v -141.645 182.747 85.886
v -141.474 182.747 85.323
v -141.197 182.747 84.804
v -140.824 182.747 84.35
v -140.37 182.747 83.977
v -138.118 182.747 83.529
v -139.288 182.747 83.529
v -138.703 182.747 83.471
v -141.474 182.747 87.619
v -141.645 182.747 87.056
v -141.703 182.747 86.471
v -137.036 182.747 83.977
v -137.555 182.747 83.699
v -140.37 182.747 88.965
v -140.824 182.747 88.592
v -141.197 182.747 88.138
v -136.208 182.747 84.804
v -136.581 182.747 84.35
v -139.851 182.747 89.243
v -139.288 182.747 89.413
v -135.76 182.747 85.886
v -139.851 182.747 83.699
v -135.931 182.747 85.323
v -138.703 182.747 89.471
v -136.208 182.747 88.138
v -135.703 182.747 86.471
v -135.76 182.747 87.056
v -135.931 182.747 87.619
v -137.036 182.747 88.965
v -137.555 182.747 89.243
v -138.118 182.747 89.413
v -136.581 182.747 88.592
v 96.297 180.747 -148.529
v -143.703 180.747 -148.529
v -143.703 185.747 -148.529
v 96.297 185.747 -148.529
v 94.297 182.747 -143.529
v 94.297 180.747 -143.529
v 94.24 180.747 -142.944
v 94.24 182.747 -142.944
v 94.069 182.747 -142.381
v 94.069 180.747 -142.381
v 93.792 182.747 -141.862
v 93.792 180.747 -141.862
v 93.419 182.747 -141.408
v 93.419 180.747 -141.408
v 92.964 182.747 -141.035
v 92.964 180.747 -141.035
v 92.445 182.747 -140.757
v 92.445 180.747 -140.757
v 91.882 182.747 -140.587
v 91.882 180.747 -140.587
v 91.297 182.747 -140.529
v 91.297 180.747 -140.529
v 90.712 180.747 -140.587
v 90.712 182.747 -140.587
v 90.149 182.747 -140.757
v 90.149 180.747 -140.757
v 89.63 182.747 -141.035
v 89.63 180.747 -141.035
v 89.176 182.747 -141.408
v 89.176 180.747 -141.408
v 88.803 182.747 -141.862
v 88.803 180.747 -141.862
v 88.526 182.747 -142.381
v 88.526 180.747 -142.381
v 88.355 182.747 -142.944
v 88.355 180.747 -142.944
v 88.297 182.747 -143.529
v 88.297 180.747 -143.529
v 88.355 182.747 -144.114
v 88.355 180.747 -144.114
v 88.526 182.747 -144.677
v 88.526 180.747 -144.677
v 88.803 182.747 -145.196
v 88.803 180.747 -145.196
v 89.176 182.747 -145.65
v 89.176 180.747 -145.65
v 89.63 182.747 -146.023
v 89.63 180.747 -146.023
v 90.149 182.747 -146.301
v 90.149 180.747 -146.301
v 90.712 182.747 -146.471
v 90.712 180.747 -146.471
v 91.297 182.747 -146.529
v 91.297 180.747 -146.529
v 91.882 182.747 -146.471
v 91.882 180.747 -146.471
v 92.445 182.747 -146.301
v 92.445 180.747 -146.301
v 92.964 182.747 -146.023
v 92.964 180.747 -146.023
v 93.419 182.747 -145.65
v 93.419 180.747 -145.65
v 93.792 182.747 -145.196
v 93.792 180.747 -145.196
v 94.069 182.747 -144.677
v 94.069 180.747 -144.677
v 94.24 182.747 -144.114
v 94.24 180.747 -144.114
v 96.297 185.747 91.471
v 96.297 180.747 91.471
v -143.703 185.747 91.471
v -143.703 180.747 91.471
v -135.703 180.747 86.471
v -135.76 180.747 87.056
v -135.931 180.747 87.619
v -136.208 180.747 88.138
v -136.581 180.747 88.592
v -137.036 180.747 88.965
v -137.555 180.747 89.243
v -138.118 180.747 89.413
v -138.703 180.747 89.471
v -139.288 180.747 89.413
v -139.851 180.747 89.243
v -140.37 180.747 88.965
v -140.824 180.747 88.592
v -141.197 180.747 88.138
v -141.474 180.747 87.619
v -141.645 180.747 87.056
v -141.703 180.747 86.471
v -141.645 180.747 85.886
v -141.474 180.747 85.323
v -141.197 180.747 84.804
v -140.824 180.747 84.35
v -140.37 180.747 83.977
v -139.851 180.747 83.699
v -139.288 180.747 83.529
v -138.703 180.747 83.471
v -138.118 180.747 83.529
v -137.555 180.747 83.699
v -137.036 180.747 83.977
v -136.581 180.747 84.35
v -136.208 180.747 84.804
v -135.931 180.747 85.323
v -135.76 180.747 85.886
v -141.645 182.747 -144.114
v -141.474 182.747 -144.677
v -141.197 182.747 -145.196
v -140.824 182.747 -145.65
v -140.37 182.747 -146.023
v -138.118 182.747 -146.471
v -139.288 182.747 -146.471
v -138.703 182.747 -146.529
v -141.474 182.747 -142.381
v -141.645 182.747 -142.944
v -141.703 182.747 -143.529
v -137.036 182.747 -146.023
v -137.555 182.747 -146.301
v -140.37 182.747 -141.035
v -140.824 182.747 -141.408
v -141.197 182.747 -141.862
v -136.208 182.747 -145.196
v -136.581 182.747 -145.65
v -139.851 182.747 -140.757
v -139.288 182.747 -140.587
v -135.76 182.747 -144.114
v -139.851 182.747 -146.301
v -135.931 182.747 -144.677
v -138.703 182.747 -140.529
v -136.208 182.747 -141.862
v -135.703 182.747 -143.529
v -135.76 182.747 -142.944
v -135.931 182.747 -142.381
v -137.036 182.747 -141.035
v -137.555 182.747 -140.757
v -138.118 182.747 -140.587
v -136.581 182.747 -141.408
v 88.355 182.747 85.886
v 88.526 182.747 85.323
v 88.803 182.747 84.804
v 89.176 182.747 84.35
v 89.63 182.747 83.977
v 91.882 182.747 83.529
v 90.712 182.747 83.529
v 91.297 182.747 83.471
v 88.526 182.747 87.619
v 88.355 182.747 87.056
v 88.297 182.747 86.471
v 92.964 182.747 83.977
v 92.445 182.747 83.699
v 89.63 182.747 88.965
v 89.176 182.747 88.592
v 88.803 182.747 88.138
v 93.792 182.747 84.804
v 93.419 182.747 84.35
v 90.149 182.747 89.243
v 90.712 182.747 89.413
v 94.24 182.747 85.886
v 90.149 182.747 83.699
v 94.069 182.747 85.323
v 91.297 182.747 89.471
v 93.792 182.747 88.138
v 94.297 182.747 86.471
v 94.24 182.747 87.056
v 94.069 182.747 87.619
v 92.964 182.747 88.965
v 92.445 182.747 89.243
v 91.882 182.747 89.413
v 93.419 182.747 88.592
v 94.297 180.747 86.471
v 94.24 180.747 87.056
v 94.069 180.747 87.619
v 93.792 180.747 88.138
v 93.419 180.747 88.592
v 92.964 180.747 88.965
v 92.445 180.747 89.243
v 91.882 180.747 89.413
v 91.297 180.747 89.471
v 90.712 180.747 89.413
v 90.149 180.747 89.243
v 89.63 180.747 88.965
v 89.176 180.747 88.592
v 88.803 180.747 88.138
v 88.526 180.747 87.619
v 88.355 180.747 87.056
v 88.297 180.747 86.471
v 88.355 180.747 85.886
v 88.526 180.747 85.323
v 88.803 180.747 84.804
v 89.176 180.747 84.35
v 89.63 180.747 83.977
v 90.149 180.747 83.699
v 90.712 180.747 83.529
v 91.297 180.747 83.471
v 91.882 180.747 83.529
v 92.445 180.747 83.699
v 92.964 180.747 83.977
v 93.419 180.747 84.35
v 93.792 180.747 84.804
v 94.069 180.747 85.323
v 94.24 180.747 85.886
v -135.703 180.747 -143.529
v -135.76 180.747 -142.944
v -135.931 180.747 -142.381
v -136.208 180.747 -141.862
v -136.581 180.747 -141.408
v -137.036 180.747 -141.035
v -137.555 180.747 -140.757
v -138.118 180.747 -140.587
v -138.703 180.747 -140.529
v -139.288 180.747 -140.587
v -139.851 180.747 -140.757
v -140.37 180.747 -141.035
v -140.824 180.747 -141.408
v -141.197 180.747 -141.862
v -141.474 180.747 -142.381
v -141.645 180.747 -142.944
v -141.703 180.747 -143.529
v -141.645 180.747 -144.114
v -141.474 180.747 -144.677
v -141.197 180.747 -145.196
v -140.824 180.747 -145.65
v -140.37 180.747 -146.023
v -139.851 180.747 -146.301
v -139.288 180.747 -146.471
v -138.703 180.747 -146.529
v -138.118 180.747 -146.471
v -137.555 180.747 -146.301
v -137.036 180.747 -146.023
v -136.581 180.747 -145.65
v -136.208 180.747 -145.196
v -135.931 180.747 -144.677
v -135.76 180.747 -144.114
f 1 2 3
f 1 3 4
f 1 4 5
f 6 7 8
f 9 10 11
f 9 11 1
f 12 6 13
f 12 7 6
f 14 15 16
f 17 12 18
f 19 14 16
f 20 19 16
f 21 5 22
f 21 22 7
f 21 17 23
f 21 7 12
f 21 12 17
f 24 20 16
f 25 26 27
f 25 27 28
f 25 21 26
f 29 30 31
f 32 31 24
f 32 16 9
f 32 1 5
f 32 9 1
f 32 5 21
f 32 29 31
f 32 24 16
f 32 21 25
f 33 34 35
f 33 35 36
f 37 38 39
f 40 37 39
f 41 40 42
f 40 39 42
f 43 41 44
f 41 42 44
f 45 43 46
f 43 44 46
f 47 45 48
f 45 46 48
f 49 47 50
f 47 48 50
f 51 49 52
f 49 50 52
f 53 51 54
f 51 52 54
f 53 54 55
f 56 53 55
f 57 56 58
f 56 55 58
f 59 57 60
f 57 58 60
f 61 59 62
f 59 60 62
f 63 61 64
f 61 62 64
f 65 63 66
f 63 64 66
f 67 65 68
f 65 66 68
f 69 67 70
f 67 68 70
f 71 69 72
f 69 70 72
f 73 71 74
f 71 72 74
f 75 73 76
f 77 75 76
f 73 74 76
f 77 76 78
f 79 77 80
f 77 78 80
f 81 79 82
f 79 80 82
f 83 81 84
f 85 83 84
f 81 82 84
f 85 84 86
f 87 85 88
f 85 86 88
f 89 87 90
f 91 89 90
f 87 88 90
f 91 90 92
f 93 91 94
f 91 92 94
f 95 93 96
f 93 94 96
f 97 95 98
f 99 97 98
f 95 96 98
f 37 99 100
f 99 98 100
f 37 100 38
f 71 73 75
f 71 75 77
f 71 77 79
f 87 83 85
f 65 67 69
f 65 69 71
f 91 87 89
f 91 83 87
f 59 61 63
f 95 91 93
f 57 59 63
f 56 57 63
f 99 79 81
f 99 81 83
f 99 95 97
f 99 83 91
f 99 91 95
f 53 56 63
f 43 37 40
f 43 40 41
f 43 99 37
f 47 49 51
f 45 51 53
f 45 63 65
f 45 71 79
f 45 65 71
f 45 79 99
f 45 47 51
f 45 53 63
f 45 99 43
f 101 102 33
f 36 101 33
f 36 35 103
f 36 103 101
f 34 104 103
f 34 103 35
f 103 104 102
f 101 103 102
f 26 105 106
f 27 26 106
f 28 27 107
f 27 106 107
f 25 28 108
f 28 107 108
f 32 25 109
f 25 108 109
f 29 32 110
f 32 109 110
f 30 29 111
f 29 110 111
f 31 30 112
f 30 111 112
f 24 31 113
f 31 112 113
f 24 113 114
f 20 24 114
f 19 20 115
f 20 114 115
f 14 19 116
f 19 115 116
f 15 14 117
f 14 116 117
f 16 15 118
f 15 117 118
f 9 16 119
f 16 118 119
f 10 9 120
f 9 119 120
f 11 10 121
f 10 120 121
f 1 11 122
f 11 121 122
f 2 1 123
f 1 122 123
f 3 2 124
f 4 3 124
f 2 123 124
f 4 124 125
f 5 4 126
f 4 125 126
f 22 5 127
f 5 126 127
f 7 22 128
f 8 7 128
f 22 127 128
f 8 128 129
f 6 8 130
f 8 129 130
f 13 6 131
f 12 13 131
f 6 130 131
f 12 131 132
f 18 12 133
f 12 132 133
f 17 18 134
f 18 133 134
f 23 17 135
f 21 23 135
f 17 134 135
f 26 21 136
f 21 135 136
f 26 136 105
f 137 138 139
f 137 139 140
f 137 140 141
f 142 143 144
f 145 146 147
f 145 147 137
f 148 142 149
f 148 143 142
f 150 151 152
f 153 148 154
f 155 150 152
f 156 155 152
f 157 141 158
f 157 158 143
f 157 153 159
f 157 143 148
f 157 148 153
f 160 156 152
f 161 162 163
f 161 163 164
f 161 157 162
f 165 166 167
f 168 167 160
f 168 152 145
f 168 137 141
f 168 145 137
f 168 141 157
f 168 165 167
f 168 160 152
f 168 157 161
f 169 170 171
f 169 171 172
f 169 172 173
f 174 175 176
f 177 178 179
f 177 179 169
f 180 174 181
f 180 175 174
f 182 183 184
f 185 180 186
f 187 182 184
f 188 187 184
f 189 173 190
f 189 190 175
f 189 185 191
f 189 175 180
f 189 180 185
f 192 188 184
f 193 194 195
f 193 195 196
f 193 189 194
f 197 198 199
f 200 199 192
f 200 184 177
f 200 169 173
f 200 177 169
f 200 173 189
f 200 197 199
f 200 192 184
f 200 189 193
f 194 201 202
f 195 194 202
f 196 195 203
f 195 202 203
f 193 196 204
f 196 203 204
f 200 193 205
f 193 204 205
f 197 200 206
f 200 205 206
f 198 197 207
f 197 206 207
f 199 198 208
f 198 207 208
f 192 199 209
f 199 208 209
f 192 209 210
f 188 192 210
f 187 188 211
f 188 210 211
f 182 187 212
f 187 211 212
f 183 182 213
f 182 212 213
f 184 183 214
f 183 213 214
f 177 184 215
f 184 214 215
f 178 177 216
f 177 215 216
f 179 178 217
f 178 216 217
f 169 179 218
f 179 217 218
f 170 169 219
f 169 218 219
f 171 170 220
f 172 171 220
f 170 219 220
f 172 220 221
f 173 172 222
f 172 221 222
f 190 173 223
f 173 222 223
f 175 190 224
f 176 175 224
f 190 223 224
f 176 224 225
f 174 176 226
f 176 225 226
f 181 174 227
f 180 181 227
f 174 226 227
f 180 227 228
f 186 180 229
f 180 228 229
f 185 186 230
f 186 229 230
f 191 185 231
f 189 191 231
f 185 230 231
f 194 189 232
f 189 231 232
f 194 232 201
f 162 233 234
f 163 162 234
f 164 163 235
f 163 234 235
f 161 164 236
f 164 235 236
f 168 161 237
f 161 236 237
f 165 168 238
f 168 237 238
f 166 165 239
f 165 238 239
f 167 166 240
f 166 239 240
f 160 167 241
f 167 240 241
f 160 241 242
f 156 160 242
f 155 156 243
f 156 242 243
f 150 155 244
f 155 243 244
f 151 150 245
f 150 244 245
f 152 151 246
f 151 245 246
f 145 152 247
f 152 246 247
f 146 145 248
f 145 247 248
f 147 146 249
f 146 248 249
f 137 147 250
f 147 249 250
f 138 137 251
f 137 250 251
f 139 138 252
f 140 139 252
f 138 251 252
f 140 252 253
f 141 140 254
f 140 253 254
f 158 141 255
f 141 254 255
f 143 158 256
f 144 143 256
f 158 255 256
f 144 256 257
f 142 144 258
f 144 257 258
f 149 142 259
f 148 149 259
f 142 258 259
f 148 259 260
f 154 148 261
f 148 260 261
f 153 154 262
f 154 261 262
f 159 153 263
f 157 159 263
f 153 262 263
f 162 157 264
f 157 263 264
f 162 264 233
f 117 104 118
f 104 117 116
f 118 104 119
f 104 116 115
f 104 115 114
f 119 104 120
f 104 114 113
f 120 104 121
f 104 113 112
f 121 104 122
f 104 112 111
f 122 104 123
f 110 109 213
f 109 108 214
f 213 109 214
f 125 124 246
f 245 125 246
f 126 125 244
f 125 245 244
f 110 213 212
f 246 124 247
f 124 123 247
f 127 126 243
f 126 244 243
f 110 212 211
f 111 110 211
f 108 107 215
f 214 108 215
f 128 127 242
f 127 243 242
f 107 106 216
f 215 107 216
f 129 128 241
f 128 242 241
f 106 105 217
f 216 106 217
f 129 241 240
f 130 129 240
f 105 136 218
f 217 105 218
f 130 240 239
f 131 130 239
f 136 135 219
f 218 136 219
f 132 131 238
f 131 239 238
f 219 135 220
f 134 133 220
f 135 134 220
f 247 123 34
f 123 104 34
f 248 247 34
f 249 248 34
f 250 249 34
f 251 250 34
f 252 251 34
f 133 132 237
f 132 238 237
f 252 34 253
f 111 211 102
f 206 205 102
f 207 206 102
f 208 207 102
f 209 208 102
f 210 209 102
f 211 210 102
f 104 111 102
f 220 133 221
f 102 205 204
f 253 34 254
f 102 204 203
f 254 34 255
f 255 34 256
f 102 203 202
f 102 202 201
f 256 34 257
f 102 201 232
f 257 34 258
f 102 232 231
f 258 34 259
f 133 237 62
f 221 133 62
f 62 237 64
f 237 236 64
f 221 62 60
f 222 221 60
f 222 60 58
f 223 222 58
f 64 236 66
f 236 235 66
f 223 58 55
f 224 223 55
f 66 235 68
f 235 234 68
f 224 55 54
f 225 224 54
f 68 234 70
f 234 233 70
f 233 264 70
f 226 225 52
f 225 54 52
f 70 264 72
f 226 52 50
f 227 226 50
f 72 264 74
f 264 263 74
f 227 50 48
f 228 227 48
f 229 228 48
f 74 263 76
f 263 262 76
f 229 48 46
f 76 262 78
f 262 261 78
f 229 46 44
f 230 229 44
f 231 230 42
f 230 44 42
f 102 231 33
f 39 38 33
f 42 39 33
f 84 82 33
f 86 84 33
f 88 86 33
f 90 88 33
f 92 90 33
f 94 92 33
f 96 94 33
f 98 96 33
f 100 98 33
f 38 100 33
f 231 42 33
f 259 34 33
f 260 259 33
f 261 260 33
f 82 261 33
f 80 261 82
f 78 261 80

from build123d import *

# Parameters (mm, degrees)
SKETCH1_W           = 240
SKETCH1_H           = 240
BOSS_EXTRUDE1_DEPTH = 5
SKETCH2_R           = 3
CUT_EXTRUDE1_DEPTH  = 2


with BuildPart() as part:
    # Sketch1 → Boss-Extrude1 (new body)
    with BuildSketch(Plane(origin=(0, 180.747129437, 0), x_dir=(1, 0, 0), z_dir=(0, 1, 0))):
        with Locations((-23.70280819, 28.529034587)):
            Rectangle(SKETCH1_W, SKETCH1_H)
    extrude(amount=BOSS_EXTRUDE1_DEPTH)

    # Sketch2 → Cut-Extrude1 (cut)
    with BuildSketch(Plane.XZ.offset(-180.747129437)):
        with Locations((-138.70280819, 86.470965413)):
            Circle(SKETCH2_R)
        with Locations((91.29719181, 86.470965413)):
            Circle(SKETCH2_R)
        with Locations((91.29719181, -143.529034587)):
            Circle(SKETCH2_R)
        with Locations((-138.70280819, -143.529034587)):
            Circle(SKETCH2_R)
    extrude(amount=-CUT_EXTRUDE1_DEPTH, mode=Mode.SUBTRACT)


solid = part.part
